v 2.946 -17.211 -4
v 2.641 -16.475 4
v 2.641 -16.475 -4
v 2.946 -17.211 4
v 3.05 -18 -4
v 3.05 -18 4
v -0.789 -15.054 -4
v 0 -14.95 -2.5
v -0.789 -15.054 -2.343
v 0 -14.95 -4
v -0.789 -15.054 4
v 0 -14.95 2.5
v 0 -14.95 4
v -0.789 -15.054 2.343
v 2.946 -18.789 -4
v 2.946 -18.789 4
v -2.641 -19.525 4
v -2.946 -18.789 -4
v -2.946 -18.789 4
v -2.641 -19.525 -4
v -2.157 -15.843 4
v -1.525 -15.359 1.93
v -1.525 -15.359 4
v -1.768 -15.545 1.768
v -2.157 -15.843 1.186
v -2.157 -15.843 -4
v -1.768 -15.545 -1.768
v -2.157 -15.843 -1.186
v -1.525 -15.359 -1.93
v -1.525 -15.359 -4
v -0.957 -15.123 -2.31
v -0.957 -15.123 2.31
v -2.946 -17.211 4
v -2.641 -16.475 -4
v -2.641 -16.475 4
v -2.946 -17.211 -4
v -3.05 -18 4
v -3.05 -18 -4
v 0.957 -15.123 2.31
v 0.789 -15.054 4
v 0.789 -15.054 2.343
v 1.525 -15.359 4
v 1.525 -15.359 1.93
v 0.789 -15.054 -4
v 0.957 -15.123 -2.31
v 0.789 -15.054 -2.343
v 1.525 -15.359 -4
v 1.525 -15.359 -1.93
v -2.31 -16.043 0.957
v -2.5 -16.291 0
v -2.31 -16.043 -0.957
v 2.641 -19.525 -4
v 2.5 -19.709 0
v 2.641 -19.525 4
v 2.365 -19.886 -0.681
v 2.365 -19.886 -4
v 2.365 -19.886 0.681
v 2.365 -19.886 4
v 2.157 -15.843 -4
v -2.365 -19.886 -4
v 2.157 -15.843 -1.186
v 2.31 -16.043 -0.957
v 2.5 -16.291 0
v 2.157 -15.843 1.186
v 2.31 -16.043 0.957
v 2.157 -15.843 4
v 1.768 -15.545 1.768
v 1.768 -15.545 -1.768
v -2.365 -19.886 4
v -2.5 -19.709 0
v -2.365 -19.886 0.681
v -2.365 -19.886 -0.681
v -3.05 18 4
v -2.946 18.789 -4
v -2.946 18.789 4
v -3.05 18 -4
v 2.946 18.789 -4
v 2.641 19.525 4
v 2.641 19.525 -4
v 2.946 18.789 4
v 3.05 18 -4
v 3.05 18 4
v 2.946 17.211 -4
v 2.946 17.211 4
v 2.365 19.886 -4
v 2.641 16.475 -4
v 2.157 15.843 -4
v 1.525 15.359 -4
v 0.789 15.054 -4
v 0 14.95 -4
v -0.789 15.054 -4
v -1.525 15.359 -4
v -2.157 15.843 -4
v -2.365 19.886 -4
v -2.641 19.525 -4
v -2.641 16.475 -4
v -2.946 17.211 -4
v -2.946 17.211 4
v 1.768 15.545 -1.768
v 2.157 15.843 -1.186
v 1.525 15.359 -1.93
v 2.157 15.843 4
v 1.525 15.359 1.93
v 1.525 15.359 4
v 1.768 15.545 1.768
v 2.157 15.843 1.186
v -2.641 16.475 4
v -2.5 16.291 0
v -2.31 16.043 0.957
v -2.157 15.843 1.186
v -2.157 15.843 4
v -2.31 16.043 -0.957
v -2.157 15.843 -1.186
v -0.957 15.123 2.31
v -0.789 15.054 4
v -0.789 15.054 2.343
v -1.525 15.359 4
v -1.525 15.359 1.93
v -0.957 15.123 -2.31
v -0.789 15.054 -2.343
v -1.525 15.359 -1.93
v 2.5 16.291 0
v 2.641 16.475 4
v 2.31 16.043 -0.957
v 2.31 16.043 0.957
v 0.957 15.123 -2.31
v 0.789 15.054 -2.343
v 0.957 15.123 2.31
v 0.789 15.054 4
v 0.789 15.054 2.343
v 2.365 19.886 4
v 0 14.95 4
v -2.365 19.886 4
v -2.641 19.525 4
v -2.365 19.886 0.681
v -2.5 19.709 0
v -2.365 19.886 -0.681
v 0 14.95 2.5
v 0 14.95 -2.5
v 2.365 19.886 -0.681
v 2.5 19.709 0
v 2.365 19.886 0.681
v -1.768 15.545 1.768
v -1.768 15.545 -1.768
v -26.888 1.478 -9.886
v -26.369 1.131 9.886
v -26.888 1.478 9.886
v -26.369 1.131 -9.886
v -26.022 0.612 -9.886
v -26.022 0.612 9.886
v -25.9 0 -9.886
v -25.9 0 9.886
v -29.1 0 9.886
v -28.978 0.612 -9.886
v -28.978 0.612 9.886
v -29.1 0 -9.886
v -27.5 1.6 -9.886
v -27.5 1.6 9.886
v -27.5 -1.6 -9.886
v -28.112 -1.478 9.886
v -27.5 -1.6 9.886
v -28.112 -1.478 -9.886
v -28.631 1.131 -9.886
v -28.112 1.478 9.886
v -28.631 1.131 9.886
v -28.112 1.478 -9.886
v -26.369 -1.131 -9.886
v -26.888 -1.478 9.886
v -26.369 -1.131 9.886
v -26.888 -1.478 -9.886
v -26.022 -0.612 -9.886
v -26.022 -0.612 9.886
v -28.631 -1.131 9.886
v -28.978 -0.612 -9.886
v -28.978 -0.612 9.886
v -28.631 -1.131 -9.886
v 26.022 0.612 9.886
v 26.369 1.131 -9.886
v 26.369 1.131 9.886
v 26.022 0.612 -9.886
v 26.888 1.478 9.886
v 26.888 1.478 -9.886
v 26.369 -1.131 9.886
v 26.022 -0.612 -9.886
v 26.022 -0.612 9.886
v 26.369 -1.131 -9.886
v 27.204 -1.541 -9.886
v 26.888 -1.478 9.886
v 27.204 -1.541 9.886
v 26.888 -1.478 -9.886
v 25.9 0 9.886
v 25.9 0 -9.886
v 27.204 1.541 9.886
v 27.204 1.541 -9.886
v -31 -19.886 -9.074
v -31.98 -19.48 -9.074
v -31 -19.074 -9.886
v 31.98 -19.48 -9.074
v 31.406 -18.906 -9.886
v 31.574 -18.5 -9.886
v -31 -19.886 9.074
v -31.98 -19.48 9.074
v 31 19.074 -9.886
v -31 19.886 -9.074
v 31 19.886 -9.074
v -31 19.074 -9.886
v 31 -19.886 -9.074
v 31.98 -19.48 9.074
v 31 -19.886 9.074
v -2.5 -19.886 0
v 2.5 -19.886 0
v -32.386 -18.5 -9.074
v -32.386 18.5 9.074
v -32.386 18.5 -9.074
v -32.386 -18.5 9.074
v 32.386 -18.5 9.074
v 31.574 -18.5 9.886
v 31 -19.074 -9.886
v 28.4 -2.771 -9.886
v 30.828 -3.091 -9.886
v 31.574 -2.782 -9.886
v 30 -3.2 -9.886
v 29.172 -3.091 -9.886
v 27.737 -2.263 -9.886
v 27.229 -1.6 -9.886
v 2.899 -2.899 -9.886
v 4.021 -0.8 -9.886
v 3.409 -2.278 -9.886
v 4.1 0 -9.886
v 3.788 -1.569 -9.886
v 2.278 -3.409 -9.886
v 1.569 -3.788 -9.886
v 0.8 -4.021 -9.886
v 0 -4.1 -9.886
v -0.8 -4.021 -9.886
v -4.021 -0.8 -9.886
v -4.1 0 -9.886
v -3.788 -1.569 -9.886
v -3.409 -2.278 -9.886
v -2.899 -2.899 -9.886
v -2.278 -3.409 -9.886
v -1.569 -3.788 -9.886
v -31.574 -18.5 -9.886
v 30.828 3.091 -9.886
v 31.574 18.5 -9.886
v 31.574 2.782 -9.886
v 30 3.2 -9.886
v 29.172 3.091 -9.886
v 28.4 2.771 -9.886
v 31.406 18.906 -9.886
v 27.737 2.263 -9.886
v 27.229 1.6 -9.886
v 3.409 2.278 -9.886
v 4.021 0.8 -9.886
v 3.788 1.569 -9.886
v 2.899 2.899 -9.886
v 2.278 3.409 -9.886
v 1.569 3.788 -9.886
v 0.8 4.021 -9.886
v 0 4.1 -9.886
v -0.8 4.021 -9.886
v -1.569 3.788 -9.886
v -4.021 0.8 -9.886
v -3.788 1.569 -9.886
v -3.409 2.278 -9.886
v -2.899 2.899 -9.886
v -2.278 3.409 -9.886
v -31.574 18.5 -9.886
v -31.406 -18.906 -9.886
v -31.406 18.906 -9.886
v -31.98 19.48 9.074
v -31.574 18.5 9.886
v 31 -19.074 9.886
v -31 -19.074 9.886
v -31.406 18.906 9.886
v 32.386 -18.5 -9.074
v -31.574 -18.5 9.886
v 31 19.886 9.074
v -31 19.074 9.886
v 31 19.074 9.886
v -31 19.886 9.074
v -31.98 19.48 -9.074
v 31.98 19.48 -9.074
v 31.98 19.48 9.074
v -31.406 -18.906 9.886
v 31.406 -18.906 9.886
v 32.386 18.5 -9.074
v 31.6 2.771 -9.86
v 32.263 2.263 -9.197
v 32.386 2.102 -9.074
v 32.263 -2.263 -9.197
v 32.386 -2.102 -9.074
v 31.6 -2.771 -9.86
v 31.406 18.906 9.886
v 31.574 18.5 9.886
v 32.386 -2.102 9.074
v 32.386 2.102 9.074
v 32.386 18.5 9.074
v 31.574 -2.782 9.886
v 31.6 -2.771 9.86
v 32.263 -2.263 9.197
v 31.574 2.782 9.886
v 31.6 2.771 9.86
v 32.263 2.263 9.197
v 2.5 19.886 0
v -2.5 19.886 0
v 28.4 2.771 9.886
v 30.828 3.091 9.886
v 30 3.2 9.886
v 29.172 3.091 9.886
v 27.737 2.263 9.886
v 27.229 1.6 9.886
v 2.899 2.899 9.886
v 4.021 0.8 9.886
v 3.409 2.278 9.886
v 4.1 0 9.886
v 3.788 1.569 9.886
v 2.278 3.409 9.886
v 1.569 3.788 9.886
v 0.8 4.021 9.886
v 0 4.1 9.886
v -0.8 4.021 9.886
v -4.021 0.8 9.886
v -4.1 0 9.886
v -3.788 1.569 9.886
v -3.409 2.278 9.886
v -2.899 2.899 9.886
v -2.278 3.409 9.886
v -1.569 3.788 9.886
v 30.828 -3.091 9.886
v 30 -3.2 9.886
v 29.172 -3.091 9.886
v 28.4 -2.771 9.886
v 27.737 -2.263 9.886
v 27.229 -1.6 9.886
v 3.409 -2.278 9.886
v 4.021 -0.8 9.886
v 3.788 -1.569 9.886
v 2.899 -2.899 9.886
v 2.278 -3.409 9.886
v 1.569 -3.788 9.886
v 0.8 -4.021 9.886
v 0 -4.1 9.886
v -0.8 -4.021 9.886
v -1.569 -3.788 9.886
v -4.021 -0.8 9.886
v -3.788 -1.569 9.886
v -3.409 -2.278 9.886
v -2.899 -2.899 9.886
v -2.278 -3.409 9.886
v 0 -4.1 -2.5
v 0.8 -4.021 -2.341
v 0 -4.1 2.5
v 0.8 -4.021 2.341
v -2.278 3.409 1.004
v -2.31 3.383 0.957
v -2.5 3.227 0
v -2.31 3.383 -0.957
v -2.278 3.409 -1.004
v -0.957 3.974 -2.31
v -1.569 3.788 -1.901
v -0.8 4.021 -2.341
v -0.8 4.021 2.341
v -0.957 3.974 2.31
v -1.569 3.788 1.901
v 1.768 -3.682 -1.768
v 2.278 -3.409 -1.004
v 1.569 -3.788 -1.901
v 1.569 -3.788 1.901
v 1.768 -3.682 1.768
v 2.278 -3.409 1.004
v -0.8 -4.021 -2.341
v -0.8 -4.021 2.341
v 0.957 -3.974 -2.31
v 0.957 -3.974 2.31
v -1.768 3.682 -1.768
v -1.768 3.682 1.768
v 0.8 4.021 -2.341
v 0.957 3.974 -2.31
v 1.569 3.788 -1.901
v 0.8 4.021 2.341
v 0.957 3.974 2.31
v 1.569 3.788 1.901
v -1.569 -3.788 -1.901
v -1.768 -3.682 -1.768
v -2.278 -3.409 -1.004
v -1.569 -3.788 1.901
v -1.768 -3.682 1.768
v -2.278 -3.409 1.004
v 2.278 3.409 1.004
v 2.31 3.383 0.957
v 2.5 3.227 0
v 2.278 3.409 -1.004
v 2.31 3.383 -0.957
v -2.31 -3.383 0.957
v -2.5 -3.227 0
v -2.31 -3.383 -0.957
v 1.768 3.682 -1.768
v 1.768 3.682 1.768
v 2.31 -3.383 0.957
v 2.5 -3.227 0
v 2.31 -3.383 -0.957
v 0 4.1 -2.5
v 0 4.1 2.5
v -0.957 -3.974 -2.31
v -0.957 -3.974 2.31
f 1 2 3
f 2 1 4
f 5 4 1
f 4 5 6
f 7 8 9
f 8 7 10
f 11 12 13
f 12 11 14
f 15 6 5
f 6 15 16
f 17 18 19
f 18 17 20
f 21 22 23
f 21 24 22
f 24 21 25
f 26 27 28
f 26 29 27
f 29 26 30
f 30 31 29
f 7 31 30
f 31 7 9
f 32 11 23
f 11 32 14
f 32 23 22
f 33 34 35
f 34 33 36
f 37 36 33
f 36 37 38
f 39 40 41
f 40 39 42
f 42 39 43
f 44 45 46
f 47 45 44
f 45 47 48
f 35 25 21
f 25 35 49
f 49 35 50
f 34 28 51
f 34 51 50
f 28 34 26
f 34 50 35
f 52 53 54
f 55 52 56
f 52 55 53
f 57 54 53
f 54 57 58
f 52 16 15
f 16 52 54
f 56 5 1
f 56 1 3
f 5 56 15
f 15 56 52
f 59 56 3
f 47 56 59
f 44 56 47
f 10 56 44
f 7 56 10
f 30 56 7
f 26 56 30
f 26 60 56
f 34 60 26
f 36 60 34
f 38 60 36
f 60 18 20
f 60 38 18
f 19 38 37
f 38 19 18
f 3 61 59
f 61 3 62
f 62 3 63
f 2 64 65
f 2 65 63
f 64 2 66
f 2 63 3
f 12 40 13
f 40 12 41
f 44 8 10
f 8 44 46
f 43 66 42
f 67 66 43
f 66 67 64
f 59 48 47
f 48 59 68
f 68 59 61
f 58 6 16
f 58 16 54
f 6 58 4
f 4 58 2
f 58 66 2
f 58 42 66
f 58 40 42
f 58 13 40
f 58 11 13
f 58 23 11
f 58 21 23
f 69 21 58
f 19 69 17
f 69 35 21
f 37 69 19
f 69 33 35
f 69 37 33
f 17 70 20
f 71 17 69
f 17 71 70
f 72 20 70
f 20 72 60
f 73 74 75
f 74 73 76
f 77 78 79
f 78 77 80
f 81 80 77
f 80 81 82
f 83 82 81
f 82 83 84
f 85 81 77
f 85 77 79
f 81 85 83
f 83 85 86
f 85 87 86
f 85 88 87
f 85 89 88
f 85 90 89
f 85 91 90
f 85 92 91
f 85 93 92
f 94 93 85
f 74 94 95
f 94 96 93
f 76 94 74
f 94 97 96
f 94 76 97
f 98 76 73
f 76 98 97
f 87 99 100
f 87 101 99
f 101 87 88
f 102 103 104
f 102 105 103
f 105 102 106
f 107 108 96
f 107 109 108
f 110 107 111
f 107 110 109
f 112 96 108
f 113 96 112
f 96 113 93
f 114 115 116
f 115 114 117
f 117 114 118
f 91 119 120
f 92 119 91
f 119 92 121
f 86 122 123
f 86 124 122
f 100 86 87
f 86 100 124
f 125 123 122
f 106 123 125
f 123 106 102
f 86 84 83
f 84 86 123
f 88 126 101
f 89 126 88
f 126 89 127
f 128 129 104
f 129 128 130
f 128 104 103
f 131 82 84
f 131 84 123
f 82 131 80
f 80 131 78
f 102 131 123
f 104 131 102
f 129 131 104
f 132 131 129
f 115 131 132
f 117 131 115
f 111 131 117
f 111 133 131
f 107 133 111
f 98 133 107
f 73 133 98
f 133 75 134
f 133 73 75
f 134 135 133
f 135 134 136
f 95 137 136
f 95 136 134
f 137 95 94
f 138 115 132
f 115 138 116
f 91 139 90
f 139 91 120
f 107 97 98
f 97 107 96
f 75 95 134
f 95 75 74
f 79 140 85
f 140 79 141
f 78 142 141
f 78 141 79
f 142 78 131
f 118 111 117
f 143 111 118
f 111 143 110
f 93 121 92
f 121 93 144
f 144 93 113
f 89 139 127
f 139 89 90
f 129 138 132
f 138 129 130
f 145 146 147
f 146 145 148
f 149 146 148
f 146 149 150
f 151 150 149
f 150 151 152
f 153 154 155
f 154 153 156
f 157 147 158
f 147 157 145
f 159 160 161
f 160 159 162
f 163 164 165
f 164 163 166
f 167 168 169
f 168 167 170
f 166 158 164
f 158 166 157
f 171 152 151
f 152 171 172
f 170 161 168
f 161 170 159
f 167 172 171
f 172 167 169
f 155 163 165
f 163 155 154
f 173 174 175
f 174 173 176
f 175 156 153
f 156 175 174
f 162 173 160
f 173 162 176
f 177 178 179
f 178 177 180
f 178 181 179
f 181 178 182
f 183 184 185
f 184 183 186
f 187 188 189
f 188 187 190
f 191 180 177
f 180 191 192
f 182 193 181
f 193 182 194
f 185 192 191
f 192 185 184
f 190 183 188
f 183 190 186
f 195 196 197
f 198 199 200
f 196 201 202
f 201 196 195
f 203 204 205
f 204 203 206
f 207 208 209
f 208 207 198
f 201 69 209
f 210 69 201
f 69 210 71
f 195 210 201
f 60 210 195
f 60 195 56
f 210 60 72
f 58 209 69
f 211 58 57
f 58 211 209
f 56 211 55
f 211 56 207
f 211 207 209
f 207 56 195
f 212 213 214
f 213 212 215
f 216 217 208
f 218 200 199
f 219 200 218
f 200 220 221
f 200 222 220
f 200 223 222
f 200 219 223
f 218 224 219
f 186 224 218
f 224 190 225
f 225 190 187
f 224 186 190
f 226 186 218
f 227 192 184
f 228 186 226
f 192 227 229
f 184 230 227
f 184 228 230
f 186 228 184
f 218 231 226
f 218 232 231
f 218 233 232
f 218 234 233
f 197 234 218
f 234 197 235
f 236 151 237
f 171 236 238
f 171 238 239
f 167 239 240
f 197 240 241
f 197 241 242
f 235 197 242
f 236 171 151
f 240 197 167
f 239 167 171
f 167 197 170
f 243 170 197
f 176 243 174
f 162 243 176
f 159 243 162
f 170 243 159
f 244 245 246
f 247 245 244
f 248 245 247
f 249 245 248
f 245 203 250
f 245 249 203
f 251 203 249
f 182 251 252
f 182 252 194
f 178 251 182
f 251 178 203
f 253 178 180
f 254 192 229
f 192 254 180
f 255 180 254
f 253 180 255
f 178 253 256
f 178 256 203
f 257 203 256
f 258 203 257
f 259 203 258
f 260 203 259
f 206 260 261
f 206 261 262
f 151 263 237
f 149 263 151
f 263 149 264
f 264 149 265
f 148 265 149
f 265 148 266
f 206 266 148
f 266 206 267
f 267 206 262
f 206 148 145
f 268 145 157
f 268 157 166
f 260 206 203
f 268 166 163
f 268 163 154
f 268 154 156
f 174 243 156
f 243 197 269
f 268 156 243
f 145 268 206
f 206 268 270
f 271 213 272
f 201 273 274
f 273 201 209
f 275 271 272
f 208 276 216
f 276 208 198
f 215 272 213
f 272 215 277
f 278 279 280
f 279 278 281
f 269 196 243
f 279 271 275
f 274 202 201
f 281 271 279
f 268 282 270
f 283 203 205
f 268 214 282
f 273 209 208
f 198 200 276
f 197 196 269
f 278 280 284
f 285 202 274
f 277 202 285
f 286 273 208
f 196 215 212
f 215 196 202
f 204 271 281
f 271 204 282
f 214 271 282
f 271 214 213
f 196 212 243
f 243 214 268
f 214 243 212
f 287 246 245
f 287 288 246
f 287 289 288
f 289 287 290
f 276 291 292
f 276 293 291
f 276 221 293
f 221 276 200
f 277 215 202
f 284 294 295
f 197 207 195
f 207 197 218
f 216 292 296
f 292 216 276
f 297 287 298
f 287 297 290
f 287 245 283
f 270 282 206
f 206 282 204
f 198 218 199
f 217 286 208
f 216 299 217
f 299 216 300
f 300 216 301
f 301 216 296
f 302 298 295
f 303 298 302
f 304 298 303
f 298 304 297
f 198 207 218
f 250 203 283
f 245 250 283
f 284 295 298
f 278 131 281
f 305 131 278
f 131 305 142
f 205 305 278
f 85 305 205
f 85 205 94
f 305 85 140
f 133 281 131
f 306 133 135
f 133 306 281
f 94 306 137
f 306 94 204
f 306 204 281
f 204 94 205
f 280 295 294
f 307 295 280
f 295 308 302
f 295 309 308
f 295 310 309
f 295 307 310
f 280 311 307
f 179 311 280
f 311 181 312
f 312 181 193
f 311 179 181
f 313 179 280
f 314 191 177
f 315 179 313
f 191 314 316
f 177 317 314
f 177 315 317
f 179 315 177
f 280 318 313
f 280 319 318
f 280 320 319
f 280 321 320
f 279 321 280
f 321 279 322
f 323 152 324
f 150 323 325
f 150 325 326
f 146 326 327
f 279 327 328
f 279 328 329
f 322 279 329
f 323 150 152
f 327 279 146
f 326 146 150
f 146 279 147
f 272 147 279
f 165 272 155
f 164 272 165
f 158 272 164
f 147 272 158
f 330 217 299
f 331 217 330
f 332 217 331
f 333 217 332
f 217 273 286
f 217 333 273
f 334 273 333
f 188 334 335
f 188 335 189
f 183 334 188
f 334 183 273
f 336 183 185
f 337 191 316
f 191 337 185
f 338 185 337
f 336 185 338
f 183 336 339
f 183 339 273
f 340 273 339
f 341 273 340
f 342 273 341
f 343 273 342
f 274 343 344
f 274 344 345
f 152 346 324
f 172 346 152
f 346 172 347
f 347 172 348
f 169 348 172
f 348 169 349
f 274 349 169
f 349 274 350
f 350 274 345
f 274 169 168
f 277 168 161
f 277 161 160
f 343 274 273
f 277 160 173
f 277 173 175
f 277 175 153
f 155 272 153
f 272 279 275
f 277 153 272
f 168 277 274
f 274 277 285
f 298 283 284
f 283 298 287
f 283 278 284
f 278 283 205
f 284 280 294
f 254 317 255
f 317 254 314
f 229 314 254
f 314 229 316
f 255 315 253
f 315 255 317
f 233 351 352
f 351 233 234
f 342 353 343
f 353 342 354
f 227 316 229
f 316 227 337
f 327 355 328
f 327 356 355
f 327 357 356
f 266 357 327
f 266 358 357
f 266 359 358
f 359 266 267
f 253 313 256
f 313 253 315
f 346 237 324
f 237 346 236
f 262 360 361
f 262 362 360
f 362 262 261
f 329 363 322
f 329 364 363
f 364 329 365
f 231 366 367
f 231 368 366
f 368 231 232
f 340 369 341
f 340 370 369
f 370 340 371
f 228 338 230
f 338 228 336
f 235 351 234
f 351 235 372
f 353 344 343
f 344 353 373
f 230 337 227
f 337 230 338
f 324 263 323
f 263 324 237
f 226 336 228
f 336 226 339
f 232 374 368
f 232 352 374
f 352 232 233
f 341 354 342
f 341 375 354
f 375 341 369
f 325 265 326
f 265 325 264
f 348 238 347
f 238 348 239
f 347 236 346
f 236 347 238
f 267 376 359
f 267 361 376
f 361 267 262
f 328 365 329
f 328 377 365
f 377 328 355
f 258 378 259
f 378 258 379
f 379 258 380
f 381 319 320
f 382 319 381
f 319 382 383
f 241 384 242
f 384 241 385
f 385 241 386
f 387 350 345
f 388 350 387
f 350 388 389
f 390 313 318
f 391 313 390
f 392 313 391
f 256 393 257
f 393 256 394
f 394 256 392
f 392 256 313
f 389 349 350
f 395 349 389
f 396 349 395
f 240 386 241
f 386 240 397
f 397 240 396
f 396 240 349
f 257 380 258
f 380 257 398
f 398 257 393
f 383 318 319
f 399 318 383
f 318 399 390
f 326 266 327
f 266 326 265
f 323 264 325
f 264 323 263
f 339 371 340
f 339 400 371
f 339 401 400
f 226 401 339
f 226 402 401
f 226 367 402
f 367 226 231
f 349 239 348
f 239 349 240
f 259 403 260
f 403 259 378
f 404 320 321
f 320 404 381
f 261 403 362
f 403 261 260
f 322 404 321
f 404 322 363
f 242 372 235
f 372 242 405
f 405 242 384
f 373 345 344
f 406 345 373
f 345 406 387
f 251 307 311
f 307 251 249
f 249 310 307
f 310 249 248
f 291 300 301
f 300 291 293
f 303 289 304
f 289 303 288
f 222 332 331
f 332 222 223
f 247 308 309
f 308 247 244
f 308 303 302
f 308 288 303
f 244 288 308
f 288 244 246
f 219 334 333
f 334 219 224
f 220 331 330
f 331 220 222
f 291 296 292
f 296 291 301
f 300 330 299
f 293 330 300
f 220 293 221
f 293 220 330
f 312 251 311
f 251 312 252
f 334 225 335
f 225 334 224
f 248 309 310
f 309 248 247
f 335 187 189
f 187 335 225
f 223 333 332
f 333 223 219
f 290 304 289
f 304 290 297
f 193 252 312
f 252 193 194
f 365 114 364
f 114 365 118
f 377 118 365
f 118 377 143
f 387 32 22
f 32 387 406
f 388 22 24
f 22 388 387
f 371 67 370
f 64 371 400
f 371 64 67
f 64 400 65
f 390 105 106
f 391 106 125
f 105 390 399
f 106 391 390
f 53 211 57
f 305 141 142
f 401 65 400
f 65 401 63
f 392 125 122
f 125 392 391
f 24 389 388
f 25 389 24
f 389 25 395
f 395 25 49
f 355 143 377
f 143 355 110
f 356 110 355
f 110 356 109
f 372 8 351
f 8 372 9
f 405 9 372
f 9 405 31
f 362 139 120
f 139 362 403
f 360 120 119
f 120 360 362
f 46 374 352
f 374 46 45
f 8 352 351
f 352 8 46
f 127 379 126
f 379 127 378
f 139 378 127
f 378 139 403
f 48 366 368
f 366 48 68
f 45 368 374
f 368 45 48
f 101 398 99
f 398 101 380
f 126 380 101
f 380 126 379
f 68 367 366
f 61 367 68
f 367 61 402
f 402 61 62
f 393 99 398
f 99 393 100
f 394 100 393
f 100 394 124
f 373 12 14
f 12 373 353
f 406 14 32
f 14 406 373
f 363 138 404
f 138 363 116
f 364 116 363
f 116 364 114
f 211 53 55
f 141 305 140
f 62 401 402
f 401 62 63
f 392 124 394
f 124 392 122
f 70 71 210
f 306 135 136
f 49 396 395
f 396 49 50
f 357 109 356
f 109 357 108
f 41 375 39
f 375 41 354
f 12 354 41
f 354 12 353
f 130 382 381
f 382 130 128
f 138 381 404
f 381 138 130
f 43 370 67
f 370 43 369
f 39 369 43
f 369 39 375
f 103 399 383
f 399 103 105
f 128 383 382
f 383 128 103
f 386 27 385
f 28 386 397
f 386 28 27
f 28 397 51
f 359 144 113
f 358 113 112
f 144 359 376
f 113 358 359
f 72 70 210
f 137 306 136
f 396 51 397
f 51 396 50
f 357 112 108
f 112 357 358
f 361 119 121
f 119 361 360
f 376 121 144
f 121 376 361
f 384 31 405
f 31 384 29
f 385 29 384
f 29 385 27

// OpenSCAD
// ============================================================
//  tail_link_parametric.scad — Aktive Gelenk-Flansche J1 + J2
//  Erzeugt J1 (lever=30mm) oder J2 (lever=25mm)
//  Material: PETG, 50% Infill
// ============================================================

// ← Hier anpassen für J1 oder J2:
joint_name   = "J1";   // "J1" oder "J2"
lever_length = 30;     // J1=30mm, J2=25mm

// Berechnete Amplitude (nur Info):
// theta_max = arcsin(3mm / lever_length)
// J1: arcsin(3/30) ≈ 5.74°
// J2: arcsin(3/25) ≈ 6.89°

// Abmessungen
breite     = (lever_length == 30) ? 65 : 60;
tiefe      = (lever_length == 30) ? 40 : 38;
hoehe      = 20;
achse_r    = 4.1;   // Ø8.2mm für M8-Bolzen (leichtes Spiel)
lager_r    = 3.05;  // Ø6.1mm für 626-ZZ Kugellager
fase       = 1.5;

module gelenk_flansch(b, t, h, lever, achse_r, lager_r, fase) {
    difference() {
        // Hauptkörper
        hull() {
            for (x = [-b/2+fase, b/2-fase])
            for (y = [-t/2+fase, t/2-fase])
            for (z = [-h/2+fase, h/2-fase])
                translate([x, y, z]) sphere(r=fase, $fn=8);
        }

        // Zentrale Achsen-Bohrung (Ø8mm für M8-Bolzen)
        cylinder(h=h+1, r=achse_r, $fn=32, center=true);

        // Kugellager-Sitze beidseitig (626-ZZ, Ø6mm)
        for (y = [-t/2+2, t/2-2])
            translate([0, y, 0])
                cylinder(h=8, r=lager_r, $fn=24, center=true);

        // Zug-Stoß-Stangen-Anschluss (M6-Gewinde, am Hebelpunkt)
        translate([lever, 0, 0])
            cylinder(h=h+1, r=3.2, $fn=24, center=true);

        // Montagebohrungen zum Körper (2× M3)
        for (x = [-b/2+5, b/2-5])
            translate([x, 0, 0])
                cylinder(h=h+1, r=1.6, $fn=16, center=true);

        // Kabelkanal (Ø5mm, längs)
        translate([0, 0, 0])
            rotate([90, 0, 0])
                cylinder(h=t+1, r=2.5, $fn=16, center=true);
    }
}

gelenk_flansch(breite, tiefe, hoehe, lever_length, achse_r, lager_r, fase);

echo(str("Gelenk-Flansch ", joint_name, ": ", breite, "×", tiefe, "×", hoehe, "mm"));
echo(str("Hebel-Länge: ", lever_length, "mm"));
echo(str("Material: PETG | Infill: 50%"));
